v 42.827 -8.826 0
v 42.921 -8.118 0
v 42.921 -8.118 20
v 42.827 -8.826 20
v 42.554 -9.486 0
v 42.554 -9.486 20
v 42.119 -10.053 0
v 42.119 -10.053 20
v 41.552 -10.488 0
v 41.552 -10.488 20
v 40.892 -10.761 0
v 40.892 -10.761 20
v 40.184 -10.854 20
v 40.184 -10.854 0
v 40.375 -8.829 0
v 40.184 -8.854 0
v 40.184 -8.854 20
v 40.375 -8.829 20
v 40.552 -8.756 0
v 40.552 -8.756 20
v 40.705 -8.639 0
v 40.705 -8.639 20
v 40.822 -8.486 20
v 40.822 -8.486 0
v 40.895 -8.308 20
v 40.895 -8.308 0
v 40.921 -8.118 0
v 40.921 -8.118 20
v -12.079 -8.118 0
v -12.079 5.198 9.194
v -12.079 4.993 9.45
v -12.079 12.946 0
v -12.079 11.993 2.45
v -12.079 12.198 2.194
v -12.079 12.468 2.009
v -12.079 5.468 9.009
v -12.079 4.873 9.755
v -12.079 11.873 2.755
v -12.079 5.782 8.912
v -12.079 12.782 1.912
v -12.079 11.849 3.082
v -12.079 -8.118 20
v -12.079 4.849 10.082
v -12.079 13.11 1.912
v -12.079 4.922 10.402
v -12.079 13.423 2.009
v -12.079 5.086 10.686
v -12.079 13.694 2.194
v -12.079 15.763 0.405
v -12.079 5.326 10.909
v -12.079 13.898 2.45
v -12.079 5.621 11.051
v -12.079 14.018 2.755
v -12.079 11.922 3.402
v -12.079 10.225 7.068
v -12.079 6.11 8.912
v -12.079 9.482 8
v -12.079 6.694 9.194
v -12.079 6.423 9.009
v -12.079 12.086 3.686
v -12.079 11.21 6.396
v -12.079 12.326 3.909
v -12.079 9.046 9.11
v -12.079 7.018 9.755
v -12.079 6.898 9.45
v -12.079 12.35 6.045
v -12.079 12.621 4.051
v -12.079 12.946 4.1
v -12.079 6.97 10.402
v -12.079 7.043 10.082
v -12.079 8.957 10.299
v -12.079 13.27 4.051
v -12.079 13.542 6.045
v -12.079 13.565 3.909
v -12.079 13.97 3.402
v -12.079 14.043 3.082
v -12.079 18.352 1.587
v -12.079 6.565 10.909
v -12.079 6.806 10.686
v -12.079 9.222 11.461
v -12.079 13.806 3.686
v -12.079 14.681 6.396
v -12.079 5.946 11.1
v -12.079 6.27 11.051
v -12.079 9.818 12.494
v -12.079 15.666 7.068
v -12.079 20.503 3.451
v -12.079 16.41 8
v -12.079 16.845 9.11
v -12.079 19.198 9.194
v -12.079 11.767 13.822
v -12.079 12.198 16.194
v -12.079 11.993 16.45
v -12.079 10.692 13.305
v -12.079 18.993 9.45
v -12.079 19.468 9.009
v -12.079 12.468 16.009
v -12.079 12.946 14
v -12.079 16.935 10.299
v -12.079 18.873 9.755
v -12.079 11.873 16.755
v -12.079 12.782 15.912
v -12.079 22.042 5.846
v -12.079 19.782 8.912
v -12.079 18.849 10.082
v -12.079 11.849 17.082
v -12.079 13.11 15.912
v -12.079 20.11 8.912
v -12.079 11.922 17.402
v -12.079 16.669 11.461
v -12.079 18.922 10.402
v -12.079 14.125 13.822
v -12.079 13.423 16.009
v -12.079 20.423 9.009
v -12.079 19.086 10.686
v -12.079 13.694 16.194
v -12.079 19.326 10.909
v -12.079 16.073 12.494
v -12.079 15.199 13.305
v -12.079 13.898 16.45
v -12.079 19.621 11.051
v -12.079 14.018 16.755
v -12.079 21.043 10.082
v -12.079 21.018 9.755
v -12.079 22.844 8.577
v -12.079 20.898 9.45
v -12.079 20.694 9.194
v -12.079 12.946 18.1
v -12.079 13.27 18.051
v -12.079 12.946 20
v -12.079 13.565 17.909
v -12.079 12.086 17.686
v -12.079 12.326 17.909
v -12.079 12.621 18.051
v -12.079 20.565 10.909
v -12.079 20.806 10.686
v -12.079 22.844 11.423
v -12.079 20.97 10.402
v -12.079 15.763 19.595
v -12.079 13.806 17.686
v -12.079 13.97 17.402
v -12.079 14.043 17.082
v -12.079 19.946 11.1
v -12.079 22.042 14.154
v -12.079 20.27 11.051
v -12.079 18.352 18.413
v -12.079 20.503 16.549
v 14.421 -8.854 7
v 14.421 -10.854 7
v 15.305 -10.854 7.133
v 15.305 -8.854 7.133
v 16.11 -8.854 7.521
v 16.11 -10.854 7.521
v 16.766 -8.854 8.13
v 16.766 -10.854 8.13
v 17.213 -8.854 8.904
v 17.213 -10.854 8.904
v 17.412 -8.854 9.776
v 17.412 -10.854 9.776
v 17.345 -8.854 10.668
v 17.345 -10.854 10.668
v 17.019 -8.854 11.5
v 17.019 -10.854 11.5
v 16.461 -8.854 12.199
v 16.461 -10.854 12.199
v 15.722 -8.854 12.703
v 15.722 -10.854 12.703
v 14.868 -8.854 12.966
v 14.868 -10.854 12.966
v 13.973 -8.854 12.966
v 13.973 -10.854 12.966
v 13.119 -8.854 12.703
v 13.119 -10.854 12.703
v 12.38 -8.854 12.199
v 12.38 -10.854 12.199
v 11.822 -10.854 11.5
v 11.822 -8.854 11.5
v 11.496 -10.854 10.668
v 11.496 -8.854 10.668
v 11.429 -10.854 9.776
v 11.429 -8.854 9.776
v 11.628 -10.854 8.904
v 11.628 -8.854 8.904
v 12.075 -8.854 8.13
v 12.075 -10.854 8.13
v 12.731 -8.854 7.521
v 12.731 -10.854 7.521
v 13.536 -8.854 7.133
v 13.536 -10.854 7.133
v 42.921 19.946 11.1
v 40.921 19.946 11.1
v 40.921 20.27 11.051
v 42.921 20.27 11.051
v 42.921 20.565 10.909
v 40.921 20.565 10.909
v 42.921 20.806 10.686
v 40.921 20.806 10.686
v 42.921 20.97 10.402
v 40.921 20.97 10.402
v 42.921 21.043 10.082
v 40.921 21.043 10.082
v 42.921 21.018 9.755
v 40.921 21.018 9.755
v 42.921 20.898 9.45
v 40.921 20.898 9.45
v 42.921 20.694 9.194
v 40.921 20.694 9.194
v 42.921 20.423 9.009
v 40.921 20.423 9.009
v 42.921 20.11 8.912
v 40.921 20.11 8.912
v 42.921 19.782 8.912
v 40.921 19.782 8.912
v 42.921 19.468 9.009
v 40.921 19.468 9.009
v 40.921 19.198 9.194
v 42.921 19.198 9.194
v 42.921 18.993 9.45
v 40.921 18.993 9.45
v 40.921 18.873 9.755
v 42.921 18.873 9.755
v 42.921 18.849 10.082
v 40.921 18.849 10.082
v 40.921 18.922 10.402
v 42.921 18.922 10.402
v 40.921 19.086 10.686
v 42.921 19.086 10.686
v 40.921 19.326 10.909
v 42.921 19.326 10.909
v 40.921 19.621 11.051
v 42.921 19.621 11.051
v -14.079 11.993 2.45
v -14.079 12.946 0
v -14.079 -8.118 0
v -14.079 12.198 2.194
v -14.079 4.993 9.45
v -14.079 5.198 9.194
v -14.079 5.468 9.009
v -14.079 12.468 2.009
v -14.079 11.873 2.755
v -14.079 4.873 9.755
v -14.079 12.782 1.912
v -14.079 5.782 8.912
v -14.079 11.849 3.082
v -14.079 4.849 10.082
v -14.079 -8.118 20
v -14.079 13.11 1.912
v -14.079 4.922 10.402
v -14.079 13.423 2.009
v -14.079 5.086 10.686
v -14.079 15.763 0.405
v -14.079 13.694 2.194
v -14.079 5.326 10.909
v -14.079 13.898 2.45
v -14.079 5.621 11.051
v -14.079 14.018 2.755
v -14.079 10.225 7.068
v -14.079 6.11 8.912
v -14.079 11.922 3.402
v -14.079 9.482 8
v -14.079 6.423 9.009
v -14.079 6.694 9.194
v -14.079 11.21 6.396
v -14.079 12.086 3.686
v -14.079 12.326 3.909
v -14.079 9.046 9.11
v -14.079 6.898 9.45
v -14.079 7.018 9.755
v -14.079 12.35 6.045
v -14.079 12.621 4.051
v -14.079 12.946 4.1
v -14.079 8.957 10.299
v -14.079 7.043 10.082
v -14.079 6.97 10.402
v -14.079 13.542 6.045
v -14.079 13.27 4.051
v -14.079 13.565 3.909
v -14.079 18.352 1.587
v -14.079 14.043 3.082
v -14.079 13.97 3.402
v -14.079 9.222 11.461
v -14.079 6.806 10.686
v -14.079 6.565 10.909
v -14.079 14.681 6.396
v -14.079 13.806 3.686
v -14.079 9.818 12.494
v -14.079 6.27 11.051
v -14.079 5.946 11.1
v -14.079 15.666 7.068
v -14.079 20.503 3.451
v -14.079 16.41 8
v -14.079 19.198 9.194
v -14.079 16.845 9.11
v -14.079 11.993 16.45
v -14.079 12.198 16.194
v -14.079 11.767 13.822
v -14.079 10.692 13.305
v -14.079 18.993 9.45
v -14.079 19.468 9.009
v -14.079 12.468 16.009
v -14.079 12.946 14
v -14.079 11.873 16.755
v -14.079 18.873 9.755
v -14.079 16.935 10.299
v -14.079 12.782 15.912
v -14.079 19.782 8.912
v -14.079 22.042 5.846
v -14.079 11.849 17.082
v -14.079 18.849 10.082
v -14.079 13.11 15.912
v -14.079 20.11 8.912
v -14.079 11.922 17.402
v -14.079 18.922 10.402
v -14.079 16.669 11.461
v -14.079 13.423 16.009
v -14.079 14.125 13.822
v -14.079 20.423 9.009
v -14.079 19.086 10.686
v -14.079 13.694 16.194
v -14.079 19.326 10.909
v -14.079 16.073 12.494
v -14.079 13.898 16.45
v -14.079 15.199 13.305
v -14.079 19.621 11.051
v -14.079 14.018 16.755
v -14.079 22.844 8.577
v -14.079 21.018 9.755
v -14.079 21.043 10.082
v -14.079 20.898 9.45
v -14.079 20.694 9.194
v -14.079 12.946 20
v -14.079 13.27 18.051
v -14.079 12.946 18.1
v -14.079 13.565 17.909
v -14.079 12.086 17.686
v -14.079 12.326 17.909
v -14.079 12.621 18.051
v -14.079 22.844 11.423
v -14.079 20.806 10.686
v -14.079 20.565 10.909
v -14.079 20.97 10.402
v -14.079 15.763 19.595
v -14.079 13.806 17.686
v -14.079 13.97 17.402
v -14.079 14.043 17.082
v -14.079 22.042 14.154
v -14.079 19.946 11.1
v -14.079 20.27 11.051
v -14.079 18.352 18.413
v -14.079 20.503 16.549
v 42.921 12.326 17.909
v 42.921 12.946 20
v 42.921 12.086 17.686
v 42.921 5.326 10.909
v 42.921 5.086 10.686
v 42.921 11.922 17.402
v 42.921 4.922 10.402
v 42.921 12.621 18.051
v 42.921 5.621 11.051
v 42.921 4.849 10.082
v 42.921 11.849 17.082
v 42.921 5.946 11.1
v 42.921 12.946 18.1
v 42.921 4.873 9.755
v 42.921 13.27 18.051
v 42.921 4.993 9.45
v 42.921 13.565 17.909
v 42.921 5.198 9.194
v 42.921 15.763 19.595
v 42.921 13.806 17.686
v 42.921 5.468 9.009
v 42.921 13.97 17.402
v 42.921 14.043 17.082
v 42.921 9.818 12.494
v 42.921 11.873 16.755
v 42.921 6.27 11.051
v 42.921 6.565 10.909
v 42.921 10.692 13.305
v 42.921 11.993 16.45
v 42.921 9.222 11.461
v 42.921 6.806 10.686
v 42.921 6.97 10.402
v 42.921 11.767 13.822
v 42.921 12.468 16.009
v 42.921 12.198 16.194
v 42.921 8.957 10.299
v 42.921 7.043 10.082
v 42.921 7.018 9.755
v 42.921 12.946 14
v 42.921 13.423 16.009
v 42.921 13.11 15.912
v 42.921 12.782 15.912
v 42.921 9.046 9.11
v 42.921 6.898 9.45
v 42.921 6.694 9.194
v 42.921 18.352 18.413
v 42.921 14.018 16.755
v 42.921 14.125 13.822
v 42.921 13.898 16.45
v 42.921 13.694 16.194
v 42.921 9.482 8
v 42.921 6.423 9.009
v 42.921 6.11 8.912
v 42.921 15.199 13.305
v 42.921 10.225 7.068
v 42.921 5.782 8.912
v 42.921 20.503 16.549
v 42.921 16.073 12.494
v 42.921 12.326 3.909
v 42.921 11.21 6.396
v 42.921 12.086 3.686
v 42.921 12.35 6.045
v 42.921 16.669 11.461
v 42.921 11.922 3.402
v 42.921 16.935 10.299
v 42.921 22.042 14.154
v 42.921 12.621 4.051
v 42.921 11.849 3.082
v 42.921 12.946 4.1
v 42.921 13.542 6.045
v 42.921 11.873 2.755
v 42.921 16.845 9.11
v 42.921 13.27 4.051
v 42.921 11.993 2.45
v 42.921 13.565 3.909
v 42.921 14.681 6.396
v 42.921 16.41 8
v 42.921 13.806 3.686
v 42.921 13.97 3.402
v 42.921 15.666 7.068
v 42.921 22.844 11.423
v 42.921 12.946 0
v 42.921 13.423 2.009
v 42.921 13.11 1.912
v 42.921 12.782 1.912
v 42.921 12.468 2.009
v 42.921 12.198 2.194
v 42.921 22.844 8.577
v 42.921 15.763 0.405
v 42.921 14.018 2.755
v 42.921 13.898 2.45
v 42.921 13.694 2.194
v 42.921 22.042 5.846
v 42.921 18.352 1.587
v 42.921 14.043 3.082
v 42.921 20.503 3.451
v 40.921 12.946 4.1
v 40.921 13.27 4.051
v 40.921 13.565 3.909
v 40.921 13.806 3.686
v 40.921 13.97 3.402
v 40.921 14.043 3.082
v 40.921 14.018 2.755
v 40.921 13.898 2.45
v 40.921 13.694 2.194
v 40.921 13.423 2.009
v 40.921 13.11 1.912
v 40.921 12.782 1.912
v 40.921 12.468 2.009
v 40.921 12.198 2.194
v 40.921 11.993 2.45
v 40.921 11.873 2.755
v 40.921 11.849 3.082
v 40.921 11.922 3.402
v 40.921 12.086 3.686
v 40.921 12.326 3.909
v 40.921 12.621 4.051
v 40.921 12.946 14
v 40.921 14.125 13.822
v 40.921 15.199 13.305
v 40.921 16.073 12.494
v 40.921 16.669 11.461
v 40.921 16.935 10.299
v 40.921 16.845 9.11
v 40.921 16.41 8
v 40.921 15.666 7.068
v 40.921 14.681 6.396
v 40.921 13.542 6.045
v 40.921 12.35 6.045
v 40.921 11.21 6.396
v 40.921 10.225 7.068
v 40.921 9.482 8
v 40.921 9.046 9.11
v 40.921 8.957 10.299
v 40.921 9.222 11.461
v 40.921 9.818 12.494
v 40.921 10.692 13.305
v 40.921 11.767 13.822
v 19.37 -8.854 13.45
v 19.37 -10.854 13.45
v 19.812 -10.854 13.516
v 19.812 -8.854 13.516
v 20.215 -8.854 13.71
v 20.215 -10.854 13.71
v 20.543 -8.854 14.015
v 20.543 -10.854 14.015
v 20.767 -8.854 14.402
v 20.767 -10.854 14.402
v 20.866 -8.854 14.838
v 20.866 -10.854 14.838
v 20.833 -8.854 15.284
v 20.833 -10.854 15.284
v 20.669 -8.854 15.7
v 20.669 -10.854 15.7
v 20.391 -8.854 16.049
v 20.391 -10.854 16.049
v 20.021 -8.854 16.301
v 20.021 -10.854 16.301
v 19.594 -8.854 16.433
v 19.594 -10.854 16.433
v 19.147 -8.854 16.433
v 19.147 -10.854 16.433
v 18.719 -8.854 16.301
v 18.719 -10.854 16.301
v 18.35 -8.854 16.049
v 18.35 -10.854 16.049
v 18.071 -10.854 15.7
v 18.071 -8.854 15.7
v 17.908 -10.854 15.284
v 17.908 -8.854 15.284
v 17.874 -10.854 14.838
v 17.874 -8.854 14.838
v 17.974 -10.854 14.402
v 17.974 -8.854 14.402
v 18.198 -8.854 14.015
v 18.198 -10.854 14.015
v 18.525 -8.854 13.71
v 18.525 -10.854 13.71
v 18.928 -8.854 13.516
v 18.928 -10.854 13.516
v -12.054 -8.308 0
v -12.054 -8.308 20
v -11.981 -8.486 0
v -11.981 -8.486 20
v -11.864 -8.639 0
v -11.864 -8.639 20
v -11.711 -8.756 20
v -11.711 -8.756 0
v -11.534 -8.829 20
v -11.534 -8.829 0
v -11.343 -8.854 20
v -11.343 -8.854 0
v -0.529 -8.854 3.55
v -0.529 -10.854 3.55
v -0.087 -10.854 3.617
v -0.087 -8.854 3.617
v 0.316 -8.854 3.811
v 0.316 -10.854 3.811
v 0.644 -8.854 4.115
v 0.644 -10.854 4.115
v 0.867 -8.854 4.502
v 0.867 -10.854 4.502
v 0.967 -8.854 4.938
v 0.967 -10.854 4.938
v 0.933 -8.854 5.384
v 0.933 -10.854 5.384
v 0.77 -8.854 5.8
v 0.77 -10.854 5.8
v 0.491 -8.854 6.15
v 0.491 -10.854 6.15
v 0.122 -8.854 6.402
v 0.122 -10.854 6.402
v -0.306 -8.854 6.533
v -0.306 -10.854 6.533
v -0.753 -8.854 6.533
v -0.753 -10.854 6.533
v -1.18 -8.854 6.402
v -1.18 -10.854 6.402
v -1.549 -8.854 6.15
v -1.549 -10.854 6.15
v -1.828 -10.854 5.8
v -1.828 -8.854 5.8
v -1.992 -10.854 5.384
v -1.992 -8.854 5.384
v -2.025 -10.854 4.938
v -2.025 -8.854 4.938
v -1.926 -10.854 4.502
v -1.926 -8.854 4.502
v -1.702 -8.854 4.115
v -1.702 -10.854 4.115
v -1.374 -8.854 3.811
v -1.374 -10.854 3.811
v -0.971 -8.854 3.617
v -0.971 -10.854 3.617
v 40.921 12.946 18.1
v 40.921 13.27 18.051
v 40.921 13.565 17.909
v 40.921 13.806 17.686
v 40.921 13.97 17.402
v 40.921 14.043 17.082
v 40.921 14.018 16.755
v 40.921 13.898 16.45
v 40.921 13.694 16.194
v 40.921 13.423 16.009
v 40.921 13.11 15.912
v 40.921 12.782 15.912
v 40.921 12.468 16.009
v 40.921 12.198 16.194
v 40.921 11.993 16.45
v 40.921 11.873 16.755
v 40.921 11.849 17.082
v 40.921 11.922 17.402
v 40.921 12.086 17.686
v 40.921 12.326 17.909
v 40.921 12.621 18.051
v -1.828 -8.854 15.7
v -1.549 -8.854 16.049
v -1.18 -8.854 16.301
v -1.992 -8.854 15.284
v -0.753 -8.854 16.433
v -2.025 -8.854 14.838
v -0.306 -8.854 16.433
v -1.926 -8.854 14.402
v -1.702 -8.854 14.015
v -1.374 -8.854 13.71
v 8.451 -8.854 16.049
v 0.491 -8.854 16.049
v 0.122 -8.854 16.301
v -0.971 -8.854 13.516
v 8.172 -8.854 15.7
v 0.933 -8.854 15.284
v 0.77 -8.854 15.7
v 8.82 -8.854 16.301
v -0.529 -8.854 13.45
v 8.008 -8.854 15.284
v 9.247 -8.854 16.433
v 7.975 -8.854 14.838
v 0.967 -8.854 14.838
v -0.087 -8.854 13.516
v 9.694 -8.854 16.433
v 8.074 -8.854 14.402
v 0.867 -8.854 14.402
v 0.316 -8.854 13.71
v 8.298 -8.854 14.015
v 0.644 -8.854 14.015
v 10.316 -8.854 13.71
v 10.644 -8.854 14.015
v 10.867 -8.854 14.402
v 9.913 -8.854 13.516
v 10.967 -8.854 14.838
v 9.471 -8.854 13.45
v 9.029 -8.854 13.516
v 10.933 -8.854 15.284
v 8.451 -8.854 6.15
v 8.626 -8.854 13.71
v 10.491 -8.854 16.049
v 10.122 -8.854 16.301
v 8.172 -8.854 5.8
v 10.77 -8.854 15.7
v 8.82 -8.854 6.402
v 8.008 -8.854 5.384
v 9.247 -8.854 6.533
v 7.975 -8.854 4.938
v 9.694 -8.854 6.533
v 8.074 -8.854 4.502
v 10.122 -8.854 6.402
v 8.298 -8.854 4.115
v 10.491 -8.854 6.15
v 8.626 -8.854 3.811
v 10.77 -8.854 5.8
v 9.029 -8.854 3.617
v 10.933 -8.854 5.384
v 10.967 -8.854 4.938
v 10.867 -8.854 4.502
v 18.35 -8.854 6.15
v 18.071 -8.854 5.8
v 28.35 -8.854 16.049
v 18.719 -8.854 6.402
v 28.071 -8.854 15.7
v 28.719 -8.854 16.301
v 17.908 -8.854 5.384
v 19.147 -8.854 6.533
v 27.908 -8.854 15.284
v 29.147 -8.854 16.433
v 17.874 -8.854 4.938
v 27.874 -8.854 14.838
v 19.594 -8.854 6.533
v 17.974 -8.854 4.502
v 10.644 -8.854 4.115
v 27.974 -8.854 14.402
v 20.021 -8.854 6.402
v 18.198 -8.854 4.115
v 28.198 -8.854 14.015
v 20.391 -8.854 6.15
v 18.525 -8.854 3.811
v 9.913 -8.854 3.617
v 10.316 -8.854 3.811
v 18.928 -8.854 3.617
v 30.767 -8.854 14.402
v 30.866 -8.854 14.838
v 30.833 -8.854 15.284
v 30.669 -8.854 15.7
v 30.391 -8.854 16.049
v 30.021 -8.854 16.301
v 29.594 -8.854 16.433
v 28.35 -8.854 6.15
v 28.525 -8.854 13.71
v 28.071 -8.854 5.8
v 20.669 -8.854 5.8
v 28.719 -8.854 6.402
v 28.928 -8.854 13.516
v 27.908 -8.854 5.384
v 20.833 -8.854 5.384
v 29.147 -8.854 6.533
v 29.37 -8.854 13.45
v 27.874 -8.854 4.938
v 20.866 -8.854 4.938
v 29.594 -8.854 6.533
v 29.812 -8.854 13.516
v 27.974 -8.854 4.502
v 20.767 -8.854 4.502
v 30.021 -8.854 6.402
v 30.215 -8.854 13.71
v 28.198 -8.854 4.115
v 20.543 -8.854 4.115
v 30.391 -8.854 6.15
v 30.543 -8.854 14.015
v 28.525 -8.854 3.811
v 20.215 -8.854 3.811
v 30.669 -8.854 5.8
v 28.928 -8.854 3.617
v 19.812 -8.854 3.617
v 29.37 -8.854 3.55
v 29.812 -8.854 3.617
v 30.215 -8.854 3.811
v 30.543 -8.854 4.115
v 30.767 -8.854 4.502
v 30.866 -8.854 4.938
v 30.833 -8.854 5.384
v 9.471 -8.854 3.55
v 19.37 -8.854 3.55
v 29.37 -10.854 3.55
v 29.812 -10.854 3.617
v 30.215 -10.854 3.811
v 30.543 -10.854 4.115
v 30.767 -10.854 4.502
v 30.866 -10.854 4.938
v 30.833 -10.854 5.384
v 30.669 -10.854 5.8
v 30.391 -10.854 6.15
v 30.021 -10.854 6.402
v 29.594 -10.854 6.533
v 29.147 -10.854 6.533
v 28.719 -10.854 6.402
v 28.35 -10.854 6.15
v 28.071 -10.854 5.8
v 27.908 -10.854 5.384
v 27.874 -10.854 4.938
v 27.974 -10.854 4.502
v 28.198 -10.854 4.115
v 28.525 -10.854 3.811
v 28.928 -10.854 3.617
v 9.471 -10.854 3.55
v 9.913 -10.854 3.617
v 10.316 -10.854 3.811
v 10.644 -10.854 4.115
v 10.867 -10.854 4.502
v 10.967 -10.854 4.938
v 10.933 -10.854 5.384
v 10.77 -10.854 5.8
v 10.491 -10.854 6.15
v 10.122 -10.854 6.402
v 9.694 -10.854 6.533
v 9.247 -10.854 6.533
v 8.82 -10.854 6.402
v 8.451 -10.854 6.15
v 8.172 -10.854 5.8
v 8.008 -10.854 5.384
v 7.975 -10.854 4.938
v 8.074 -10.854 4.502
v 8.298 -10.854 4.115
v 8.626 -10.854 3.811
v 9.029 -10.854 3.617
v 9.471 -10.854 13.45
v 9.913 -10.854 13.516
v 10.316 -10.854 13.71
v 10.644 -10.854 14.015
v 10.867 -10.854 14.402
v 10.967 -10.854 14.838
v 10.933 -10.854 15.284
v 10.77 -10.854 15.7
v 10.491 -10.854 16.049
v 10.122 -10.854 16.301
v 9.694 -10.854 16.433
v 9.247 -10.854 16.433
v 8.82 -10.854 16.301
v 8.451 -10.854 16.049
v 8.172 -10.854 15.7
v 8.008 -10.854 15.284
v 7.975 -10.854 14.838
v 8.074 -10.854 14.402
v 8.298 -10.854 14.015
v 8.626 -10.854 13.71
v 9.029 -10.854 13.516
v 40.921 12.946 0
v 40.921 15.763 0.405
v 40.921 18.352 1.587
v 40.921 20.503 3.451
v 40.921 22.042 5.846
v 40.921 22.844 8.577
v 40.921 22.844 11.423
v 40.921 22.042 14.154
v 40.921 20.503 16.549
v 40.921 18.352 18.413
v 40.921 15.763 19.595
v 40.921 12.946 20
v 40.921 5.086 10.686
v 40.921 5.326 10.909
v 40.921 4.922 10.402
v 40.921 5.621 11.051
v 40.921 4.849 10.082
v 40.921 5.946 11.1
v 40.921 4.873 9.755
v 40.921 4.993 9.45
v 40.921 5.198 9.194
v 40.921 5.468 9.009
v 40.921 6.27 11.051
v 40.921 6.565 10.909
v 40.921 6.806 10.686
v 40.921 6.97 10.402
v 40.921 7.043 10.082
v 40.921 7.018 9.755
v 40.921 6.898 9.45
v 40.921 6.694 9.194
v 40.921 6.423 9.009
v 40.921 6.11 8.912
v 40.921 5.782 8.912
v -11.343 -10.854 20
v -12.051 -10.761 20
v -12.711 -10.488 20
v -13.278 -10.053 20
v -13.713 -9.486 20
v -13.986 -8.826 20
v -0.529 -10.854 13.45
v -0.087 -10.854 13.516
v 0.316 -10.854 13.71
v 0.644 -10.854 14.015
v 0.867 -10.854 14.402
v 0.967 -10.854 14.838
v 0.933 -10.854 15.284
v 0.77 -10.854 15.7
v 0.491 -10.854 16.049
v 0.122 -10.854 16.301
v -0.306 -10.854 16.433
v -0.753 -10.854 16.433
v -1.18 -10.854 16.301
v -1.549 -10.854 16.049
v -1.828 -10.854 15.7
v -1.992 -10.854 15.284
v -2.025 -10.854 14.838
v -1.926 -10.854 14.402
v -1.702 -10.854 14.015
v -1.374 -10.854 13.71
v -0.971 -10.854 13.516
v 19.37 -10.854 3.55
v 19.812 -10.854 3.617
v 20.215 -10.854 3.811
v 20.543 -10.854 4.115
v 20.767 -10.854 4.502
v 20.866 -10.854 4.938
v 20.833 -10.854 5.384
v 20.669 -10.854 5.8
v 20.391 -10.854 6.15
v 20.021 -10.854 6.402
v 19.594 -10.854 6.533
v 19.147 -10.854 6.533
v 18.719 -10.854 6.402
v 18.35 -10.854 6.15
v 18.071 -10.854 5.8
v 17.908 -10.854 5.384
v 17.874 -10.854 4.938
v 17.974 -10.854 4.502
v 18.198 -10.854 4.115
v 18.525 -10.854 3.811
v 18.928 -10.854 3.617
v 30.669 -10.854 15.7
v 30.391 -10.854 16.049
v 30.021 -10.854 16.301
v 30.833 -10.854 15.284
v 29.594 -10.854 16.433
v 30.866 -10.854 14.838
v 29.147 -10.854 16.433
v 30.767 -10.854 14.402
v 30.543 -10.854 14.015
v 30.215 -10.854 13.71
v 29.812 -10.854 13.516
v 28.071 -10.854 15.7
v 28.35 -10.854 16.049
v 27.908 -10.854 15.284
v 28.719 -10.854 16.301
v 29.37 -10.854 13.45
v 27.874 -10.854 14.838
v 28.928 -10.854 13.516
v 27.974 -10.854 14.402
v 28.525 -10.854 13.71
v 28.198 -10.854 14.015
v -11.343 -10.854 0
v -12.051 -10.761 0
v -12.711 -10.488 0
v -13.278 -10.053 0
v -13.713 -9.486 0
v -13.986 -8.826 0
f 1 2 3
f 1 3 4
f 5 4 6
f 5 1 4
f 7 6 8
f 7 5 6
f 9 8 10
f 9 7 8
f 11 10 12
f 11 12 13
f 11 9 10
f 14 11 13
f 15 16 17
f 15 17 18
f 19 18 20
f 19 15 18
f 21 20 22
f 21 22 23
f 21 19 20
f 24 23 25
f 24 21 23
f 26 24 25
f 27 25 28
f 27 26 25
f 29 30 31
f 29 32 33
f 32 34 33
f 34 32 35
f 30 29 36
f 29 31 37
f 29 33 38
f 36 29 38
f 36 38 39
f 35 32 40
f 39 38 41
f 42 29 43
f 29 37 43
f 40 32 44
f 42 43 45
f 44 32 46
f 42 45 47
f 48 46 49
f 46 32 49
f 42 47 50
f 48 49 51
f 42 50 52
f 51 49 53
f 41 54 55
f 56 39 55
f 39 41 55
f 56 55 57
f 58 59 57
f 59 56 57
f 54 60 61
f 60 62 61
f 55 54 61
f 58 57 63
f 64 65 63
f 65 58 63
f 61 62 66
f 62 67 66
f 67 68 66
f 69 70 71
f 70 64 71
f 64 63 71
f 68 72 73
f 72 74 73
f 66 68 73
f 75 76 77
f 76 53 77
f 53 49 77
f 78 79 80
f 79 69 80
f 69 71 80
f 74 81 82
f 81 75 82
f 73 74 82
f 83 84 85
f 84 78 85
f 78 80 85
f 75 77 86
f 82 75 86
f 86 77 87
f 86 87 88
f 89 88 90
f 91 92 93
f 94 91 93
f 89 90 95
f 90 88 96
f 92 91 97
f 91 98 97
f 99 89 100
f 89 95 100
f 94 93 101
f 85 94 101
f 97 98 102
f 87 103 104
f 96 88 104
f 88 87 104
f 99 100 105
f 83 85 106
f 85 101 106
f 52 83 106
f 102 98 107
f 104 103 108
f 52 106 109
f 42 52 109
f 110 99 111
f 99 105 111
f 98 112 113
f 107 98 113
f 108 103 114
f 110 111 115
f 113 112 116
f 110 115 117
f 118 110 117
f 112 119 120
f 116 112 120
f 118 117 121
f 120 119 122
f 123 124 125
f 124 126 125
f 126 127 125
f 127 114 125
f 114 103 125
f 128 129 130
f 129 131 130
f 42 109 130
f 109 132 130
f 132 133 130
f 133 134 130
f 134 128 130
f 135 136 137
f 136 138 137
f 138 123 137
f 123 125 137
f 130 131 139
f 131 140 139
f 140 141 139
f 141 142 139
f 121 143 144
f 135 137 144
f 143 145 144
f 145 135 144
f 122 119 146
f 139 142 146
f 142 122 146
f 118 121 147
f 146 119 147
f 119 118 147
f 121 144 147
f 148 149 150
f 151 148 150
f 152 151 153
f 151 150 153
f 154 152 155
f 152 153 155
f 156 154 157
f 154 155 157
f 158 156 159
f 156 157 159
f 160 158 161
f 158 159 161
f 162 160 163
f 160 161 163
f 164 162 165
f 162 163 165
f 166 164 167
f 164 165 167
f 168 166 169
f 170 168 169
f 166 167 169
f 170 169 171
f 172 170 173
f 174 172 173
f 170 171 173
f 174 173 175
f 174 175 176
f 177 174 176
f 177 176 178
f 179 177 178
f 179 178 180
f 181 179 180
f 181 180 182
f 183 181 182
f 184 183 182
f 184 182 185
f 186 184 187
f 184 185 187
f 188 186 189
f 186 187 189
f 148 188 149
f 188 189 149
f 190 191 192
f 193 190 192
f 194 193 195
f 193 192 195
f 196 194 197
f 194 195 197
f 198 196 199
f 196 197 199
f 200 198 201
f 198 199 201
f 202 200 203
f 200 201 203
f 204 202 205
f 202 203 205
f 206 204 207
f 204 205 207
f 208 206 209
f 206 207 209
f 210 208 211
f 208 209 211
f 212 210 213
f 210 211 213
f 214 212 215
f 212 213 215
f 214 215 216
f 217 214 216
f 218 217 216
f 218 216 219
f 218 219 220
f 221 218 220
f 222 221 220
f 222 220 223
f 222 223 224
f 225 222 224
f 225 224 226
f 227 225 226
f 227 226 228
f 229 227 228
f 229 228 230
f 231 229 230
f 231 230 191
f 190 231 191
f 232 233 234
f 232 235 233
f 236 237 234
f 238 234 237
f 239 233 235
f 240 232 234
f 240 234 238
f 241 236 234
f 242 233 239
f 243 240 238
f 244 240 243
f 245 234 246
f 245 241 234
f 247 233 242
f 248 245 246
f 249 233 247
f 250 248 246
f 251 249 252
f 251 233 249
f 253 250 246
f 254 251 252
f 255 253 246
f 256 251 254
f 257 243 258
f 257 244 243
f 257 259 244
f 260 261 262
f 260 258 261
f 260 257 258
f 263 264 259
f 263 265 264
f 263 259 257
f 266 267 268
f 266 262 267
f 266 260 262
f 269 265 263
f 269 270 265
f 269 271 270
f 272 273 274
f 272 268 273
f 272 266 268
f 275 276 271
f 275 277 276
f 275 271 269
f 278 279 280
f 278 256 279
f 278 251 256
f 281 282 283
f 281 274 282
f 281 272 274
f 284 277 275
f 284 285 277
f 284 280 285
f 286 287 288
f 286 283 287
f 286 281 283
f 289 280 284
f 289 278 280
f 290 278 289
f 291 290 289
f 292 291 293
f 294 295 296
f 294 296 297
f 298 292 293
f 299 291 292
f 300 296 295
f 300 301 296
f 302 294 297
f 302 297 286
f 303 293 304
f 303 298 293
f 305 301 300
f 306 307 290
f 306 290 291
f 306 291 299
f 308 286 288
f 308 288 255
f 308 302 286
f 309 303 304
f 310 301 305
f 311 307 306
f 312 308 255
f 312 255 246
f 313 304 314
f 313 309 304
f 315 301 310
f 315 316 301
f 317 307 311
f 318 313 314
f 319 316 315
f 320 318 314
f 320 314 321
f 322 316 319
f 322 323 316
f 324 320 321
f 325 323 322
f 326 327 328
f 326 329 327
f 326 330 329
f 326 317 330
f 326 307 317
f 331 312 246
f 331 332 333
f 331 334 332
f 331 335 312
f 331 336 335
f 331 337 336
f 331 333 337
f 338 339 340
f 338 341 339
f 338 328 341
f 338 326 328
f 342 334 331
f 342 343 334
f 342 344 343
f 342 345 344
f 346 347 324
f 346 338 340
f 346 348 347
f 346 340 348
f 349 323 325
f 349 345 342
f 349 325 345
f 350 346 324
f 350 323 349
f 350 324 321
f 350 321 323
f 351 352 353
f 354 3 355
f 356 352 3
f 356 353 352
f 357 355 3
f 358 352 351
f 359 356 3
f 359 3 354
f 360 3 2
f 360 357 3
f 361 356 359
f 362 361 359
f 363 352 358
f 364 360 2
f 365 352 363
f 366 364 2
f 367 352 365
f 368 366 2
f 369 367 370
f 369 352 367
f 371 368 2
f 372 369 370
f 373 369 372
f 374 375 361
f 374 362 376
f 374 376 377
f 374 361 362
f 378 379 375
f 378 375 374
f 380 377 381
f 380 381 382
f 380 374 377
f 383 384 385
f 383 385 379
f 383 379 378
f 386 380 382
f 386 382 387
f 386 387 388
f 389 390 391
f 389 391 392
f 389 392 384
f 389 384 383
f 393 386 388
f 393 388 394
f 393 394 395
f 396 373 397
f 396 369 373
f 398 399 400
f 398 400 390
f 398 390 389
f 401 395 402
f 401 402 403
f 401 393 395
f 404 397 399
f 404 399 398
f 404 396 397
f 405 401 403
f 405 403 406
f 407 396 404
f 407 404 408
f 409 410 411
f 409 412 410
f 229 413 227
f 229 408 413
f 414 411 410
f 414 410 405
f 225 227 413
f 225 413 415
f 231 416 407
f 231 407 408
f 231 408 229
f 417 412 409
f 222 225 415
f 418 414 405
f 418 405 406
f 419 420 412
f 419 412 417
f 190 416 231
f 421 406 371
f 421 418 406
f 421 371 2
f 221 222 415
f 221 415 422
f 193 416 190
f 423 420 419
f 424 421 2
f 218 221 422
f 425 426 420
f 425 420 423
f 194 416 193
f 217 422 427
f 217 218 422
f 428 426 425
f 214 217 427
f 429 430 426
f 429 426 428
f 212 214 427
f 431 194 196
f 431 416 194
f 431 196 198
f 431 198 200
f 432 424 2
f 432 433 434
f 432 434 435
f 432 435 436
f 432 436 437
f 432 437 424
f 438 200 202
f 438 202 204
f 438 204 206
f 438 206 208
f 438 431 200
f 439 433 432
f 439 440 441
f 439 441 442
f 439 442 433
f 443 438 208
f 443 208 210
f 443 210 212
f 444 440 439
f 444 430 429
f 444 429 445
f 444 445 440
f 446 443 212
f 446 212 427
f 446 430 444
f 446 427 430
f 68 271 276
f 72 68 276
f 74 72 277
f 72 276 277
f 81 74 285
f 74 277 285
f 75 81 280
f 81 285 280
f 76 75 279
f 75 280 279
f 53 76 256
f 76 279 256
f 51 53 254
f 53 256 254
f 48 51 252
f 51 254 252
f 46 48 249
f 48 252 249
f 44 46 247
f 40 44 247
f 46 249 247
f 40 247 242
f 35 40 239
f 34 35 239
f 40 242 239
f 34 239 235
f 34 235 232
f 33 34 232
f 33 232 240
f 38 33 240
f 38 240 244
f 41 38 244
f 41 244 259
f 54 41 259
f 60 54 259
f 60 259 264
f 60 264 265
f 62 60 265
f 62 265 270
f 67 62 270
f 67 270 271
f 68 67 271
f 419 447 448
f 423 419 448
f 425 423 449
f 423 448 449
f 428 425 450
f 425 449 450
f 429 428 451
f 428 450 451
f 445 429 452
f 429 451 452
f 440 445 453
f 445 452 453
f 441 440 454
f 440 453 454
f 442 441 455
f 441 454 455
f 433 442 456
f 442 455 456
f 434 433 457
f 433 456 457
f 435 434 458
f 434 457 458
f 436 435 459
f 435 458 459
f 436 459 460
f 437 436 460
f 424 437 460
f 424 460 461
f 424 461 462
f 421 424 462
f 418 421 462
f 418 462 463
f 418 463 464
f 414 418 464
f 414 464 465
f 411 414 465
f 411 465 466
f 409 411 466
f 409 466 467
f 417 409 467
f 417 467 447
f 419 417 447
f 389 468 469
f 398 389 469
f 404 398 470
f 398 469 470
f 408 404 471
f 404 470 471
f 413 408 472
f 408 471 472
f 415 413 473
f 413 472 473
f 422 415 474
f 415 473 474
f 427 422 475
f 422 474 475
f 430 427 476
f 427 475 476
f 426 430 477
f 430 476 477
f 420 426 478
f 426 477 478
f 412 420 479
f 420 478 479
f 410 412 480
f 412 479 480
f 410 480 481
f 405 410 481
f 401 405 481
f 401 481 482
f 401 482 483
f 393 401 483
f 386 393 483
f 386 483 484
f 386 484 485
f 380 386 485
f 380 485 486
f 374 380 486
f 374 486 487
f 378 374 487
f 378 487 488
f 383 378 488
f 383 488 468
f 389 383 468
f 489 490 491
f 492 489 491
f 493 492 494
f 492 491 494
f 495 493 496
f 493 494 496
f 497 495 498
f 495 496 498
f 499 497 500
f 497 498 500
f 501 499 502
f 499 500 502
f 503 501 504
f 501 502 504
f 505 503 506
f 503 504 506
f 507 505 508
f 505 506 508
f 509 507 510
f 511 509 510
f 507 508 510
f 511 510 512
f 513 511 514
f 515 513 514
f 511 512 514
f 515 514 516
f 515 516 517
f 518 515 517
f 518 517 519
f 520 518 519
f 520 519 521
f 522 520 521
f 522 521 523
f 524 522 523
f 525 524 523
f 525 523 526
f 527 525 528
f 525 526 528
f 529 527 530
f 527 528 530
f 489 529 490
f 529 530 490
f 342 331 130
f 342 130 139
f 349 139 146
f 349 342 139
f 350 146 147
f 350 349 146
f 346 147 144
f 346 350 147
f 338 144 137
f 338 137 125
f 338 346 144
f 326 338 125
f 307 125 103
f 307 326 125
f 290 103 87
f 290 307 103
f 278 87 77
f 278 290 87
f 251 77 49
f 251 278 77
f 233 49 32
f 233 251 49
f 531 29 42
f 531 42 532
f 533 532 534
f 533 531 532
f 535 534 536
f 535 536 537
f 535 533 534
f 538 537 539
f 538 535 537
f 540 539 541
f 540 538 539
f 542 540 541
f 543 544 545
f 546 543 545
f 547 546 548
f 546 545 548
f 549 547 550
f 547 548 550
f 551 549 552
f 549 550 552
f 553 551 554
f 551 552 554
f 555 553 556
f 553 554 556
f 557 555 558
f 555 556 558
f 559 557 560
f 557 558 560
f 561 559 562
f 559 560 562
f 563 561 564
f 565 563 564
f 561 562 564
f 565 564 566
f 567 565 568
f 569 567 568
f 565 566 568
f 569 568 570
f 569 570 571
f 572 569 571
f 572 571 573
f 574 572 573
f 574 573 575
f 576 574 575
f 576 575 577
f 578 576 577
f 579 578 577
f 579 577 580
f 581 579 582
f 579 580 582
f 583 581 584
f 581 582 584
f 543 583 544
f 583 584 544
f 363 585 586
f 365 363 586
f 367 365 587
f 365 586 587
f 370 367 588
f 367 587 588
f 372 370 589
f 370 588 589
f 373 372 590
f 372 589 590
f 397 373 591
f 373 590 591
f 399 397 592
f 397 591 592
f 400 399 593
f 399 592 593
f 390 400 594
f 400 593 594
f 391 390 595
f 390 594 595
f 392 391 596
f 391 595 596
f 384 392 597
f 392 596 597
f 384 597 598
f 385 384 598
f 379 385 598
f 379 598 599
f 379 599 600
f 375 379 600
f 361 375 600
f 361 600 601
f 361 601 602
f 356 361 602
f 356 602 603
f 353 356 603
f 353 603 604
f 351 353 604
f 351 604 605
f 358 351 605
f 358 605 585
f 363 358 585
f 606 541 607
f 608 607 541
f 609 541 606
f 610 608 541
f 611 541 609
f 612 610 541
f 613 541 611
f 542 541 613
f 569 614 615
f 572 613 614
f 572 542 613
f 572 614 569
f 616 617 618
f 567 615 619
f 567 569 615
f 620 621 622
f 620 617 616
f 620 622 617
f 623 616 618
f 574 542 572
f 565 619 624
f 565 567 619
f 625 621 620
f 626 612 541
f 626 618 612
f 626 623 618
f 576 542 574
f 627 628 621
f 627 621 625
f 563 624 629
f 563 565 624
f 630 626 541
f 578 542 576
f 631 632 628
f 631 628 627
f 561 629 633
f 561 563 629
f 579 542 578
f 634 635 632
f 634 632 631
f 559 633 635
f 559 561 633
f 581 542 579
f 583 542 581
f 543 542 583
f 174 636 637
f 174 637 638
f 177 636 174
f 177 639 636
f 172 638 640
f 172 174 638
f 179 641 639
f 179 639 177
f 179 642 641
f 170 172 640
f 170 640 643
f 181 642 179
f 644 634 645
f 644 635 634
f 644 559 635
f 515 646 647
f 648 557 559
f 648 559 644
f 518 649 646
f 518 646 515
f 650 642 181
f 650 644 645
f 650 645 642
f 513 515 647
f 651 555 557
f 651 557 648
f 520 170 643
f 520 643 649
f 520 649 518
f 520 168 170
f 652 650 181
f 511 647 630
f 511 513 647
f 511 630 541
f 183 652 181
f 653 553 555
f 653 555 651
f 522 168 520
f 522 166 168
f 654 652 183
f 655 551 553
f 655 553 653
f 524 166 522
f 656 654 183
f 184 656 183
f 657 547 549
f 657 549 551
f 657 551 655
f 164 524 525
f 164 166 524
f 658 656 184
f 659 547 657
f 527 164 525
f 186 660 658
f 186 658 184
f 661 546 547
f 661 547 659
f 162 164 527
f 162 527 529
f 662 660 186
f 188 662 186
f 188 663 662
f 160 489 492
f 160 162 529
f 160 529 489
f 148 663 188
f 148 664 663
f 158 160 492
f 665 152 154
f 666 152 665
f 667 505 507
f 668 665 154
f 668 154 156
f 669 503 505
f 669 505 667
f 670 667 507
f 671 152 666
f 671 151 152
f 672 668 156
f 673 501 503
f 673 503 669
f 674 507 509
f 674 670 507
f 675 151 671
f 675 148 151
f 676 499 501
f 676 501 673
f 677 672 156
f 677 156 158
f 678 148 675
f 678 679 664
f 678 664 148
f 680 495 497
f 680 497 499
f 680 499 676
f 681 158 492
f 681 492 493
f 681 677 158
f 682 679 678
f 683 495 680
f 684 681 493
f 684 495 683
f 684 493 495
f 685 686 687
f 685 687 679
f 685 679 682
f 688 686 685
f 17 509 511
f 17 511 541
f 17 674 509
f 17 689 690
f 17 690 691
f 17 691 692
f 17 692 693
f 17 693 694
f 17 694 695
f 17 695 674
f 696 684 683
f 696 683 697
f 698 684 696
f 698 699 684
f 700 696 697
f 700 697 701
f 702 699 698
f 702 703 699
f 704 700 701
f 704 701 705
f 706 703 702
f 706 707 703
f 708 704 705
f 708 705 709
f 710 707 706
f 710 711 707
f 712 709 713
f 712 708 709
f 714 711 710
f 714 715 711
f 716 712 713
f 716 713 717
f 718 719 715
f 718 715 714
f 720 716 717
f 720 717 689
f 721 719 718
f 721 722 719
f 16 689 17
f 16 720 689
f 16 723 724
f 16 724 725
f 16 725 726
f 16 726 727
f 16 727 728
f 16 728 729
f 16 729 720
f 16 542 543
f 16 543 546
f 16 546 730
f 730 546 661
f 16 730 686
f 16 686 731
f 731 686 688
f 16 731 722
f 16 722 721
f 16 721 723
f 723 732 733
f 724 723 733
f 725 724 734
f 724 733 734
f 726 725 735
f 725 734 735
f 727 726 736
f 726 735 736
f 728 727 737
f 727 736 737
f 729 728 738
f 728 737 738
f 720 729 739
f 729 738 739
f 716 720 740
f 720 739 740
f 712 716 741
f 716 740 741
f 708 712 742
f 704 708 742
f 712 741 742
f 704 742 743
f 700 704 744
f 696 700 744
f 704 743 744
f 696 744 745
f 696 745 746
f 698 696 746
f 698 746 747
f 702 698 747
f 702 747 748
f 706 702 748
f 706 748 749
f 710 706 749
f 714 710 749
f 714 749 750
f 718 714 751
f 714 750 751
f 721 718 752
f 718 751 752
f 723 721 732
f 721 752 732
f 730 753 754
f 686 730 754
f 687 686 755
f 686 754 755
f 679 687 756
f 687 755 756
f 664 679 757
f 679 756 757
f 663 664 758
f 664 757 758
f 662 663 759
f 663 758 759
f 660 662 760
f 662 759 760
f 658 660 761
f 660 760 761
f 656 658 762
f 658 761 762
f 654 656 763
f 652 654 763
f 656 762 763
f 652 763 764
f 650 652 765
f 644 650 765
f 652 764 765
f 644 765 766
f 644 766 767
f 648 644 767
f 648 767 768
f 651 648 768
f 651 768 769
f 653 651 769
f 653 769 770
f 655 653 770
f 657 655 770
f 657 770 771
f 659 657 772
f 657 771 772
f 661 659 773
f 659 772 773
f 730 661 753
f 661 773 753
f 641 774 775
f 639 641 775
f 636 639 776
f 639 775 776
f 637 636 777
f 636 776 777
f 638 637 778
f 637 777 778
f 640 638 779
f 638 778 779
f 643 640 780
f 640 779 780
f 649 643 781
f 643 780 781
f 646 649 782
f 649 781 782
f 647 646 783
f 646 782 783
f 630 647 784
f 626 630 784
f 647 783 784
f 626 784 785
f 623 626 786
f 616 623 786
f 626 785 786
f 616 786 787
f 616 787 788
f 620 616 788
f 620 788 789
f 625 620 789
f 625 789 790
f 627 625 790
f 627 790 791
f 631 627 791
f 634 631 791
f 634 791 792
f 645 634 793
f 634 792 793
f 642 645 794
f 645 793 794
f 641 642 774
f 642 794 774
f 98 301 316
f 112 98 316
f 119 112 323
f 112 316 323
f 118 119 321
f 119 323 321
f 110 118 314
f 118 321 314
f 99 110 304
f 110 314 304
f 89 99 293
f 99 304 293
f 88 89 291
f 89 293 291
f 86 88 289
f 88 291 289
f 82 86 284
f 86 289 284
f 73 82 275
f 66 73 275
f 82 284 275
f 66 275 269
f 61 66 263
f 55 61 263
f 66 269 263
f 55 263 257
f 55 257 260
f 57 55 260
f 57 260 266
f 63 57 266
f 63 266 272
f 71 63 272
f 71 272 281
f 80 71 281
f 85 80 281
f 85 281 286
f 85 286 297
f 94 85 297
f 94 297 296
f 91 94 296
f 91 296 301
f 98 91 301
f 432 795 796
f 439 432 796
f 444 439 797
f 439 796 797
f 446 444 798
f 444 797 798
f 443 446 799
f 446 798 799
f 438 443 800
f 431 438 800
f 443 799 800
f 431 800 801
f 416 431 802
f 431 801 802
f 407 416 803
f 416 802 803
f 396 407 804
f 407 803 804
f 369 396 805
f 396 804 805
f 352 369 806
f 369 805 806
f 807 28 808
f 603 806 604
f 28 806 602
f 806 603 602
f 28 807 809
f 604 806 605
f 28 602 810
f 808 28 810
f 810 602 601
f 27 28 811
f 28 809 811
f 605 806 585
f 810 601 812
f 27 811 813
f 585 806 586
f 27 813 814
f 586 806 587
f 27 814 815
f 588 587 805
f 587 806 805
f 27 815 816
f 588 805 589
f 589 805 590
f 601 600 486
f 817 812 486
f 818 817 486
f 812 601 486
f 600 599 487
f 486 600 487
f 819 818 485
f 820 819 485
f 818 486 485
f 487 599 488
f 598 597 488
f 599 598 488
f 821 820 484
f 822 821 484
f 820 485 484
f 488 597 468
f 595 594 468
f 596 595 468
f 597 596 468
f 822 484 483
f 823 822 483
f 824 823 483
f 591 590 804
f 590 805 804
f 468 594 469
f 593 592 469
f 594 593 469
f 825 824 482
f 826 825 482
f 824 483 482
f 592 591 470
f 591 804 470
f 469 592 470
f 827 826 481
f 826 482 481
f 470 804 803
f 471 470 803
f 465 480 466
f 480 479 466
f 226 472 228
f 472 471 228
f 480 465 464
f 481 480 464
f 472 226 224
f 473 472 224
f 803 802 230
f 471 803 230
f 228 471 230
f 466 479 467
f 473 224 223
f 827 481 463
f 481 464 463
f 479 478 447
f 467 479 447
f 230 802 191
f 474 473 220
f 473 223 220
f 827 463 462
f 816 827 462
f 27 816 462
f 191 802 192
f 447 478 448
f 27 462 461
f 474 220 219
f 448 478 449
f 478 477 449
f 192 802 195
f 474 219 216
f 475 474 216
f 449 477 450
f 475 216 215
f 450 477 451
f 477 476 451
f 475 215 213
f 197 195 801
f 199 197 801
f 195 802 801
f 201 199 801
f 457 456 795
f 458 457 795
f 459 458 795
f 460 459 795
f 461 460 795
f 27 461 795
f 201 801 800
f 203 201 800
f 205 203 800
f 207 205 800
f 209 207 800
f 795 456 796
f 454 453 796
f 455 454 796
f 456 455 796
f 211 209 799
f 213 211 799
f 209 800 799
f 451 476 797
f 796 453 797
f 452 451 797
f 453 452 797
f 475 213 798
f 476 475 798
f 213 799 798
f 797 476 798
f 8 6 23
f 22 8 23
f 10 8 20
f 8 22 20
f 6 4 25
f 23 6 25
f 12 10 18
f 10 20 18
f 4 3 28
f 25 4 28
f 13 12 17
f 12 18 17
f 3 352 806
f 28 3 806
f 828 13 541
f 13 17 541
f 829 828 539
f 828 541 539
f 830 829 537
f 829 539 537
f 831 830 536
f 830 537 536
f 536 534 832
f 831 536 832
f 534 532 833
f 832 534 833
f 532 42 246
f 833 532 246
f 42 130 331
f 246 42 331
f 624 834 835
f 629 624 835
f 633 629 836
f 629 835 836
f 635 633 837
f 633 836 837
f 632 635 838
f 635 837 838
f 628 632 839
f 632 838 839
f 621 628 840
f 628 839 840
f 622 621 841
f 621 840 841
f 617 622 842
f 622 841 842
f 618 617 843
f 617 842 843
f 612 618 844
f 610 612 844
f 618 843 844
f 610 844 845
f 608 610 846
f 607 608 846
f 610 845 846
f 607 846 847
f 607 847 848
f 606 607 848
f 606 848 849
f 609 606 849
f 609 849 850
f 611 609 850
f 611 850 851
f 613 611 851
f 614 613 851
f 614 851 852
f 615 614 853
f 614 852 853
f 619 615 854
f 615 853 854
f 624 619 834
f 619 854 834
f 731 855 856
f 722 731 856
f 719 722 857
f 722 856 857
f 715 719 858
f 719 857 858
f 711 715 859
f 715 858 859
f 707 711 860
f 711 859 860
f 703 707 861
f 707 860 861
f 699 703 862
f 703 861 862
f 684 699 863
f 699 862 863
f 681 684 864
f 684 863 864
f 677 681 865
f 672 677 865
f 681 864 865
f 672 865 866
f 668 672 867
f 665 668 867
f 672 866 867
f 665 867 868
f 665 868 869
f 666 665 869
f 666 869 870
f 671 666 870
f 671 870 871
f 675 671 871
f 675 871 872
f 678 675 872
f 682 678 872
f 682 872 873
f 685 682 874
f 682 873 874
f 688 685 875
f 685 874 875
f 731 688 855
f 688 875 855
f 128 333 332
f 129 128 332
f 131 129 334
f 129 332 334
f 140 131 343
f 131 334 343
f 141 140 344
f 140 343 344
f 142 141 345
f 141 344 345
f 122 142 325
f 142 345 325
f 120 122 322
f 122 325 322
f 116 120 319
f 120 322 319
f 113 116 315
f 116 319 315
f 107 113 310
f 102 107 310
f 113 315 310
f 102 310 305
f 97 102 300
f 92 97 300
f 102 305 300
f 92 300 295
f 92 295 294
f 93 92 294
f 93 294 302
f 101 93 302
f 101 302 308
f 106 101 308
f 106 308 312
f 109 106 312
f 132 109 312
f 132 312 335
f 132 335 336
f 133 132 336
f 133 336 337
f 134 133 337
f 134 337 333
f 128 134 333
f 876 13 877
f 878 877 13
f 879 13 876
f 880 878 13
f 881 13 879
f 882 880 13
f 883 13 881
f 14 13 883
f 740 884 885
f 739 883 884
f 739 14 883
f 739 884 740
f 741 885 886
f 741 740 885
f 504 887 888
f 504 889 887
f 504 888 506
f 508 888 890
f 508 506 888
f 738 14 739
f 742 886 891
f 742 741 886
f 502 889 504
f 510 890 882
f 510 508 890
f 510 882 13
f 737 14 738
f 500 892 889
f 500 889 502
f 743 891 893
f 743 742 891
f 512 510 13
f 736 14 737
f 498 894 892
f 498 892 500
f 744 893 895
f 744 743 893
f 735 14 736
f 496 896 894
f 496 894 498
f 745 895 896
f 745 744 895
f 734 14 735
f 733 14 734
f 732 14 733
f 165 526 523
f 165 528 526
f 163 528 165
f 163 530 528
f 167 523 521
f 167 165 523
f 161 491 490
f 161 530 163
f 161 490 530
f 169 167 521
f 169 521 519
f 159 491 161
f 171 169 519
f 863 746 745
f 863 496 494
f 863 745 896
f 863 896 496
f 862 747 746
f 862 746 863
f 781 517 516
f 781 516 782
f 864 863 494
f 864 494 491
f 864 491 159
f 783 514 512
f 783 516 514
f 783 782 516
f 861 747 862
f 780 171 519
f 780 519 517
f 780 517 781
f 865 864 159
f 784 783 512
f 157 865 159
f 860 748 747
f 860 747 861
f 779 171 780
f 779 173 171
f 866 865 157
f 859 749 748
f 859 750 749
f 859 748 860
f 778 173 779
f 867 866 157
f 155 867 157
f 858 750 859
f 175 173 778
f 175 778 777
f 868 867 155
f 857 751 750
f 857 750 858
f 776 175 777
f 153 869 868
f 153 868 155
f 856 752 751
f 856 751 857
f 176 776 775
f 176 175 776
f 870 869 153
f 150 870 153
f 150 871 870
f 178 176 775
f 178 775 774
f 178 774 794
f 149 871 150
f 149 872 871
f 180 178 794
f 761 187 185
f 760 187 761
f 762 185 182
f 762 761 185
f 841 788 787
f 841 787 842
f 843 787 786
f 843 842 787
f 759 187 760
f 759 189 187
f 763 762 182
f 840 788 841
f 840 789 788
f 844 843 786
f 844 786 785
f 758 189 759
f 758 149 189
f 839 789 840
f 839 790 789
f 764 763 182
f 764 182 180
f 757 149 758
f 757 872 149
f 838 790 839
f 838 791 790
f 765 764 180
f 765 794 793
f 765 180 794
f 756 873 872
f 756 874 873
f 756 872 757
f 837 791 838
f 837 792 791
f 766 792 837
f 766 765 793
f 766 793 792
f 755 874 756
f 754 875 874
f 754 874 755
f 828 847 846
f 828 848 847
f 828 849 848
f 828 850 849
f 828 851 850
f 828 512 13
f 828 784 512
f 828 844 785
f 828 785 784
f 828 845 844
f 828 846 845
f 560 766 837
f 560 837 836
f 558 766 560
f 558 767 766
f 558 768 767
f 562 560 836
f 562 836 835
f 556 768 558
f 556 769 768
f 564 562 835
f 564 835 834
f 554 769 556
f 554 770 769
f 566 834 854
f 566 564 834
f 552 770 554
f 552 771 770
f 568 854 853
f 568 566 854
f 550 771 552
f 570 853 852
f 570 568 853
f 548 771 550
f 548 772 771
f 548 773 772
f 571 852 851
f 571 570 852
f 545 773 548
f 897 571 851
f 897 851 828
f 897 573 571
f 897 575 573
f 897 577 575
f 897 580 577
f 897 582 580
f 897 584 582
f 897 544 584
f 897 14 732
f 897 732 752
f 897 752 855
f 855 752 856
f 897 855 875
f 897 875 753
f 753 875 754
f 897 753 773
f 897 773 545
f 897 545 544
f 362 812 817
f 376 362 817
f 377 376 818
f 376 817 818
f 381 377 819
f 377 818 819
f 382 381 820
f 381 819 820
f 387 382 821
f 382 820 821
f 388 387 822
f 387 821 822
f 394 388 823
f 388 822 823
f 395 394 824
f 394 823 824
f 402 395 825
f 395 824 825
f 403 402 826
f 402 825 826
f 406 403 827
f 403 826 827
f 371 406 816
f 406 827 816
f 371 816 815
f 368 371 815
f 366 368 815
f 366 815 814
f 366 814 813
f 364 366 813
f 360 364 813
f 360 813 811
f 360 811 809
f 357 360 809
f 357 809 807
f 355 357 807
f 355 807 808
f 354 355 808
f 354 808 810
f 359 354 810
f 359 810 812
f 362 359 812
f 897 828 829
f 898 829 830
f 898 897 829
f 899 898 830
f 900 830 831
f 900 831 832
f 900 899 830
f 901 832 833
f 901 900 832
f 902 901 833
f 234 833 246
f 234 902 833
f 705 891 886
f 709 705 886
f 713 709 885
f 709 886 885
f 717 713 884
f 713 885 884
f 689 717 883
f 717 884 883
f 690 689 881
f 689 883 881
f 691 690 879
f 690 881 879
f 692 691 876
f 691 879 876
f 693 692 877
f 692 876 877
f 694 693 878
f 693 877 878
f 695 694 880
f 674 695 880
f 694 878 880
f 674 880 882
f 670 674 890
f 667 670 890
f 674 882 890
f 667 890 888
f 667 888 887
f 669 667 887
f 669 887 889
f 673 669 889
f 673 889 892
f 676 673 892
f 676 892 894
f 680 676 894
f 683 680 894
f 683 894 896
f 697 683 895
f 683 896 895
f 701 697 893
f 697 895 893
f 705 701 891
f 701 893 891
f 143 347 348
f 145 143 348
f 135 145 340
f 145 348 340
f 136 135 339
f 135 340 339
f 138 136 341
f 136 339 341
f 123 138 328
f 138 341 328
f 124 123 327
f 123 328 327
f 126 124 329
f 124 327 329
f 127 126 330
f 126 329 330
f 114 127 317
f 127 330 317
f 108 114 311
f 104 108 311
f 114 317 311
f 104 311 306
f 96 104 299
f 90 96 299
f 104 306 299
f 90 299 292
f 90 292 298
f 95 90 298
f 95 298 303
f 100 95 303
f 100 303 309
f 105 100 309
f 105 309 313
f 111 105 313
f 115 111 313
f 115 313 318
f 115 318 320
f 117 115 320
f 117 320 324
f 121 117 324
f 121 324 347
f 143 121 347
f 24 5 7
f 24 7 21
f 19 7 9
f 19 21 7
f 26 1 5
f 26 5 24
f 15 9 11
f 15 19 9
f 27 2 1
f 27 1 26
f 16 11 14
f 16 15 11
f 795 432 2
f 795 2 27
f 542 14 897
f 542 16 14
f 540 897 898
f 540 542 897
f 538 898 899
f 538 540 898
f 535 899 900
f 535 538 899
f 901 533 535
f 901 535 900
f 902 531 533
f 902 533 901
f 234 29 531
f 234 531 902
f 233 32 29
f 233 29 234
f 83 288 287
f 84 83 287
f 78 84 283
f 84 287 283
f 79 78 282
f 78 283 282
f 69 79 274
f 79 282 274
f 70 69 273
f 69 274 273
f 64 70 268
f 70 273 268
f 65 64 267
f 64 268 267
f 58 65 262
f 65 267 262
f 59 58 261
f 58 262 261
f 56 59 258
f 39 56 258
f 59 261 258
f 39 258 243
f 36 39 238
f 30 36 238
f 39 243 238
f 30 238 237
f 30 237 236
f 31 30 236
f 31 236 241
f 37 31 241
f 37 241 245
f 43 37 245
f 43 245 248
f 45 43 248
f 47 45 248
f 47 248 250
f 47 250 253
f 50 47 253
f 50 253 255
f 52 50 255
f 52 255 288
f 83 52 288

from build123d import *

# Parameters (mm, degrees)
SM_BASE_FLANGE_1_DEPTH = 20
EXTRUDE_1_DEPTH        = 2
EXTRUDE_START          = -2
EXTRUDE_2_DEPTH        = 2
SKETCH_8_R             = 4
SKETCH_8_R_2           = 1.1
CUT_EXTRUDE_1_DEPTH    = 65.618145883
SKETCH_9_R             = 3
SKETCH_9_R_2           = 1.5
CUT_EXTRUDE_2_DEPTH    = 2


# Sheet-metal steps are written as plain solids
with BuildPart() as part:
    # Sketch 1 → 基体-法兰1 (new body)
    with BuildSketch(Plane.XY):
        with BuildLine():
            Line((-12.079491004, 12.945691914), (-12.079491004, -8.117708086))
            ThreePointArc((-12.079491004, -8.117708086), (-11.863745859, -8.638562941), (-11.342891004, -8.854308086))
            Line((-11.342891004, -8.854308086), (40.183908996, -8.854308086))
            ThreePointArc((40.183908996, -8.854308086), (40.704763851, -8.638562941), (40.920508996, -8.117708086))
            Line((40.920508996, -8.117708086), (40.920508996, 12.945691914))
            Line((40.920508996, 12.945691914), (42.920508996, 12.945691914))
            Line((42.920508996, 12.945691914), (42.920508996, -8.117708086))
            ThreePointArc((42.920508996, -8.117708086), (42.118977413, -10.052776503), (40.183908996, -10.854308086))
            Line((40.183908996, -10.854308086), (-11.342891004, -10.854308086))
            ThreePointArc((-11.342891004, -10.854308086), (-13.277959422, -10.052776503), (-14.079491004, -8.117708086))
            Line((-14.079491004, -8.117708086), (-14.079491004, 12.945691914))
            Line((-14.079491004, 12.945691914), (-12.079491004, 12.945691914))
        make_face()
    extrude(amount=SM_BASE_FLANGE_1_DEPTH)

    # 草图6 → 凸台-拉伸1 (add)
    with BuildSketch(Plane.ZY.offset(14.079491004)):
        with BuildLine():
            Line((0, 12.945691914), (20, 12.945691914))
            ThreePointArc((20, 12.945691914), (10, 22.945691914), (0, 12.945691914))
        make_face()
    extrude(amount=-EXTRUDE_1_DEPTH)

    # 草图7 → 凸台-拉伸2 (add)
    with BuildSketch(Plane(origin=(42.920508996, 0, 0), x_dir=(0, 0, -1), z_dir=(1, 0, 0)).offset(EXTRUDE_START)):
        with BuildLine():
            Line((-20, 12.945691914), (0, 12.945691914))
            ThreePointArc((0, 12.945691914), (-10, 22.945691914), (-20, 12.945691914))
        make_face()
    extrude(amount=EXTRUDE_2_DEPTH)

    # 草图8 → 切除-拉伸1 (cut, through all)
    with BuildSketch(Plane.ZY.offset(14.079491004)):
        with Locations((10, 12.945691914)):
            Circle(SKETCH_8_R)
        with Locations((10, 19.945691914)):
            Circle(SKETCH_8_R_2)
        with Locations((17, 12.945691914)):
            Circle(SKETCH_8_R_2)
        with Locations((10, 5.945691914)):
            Circle(SKETCH_8_R_2)
        with Locations((3, 12.945691914)):
            Circle(SKETCH_8_R_2)
    extrude(amount=-CUT_EXTRUDE_1_DEPTH, mode=Mode.SUBTRACT)

    # 草图9 → 切除-拉伸2 (cut)
    with BuildSketch(Plane(origin=(0, -10.854308086, 0), x_dir=(-1, 0, 0), z_dir=(0, -1, 0))):
        with Locations(Location((-14.420508996, -10, 0), (0, 0, 90))):
            Circle(SKETCH_9_R)
        with Locations(Location((-29.370256464, -5.050252532, 0), (0, 0, 90))):
            Circle(SKETCH_9_R_2)
        with Locations(Location((-19.370256464, -5.050252532, 0), (0, 0, 90))):
            Circle(SKETCH_9_R_2)
        with Locations(Location((-9.470761527, -5.050252532, 0), (0, 0, 90))):
            Circle(SKETCH_9_R_2)
        with Locations(Location((-19.370256464, -14.949747468, 0), (0, 0, 90))):
            Circle(SKETCH_9_R_2)
        with Locations(Location((-9.470761527, -14.949747468, 0), (0, 0, 90))):
            Circle(SKETCH_9_R_2)
        with Locations(Location((-29.370256464, -14.949747468, 0), (0, 0, 90))):
            Circle(SKETCH_9_R_2)
        with Locations(Location((0.529238473, -5.050252532, 0), (0, 0, 90))):
            Circle(SKETCH_9_R_2)
        with Locations(Location((0.529238473, -14.949747468, 0), (0, 0, 90))):
            Circle(SKETCH_9_R_2)
    extrude(amount=-CUT_EXTRUDE_2_DEPTH, mode=Mode.SUBTRACT)


solid = part.part
